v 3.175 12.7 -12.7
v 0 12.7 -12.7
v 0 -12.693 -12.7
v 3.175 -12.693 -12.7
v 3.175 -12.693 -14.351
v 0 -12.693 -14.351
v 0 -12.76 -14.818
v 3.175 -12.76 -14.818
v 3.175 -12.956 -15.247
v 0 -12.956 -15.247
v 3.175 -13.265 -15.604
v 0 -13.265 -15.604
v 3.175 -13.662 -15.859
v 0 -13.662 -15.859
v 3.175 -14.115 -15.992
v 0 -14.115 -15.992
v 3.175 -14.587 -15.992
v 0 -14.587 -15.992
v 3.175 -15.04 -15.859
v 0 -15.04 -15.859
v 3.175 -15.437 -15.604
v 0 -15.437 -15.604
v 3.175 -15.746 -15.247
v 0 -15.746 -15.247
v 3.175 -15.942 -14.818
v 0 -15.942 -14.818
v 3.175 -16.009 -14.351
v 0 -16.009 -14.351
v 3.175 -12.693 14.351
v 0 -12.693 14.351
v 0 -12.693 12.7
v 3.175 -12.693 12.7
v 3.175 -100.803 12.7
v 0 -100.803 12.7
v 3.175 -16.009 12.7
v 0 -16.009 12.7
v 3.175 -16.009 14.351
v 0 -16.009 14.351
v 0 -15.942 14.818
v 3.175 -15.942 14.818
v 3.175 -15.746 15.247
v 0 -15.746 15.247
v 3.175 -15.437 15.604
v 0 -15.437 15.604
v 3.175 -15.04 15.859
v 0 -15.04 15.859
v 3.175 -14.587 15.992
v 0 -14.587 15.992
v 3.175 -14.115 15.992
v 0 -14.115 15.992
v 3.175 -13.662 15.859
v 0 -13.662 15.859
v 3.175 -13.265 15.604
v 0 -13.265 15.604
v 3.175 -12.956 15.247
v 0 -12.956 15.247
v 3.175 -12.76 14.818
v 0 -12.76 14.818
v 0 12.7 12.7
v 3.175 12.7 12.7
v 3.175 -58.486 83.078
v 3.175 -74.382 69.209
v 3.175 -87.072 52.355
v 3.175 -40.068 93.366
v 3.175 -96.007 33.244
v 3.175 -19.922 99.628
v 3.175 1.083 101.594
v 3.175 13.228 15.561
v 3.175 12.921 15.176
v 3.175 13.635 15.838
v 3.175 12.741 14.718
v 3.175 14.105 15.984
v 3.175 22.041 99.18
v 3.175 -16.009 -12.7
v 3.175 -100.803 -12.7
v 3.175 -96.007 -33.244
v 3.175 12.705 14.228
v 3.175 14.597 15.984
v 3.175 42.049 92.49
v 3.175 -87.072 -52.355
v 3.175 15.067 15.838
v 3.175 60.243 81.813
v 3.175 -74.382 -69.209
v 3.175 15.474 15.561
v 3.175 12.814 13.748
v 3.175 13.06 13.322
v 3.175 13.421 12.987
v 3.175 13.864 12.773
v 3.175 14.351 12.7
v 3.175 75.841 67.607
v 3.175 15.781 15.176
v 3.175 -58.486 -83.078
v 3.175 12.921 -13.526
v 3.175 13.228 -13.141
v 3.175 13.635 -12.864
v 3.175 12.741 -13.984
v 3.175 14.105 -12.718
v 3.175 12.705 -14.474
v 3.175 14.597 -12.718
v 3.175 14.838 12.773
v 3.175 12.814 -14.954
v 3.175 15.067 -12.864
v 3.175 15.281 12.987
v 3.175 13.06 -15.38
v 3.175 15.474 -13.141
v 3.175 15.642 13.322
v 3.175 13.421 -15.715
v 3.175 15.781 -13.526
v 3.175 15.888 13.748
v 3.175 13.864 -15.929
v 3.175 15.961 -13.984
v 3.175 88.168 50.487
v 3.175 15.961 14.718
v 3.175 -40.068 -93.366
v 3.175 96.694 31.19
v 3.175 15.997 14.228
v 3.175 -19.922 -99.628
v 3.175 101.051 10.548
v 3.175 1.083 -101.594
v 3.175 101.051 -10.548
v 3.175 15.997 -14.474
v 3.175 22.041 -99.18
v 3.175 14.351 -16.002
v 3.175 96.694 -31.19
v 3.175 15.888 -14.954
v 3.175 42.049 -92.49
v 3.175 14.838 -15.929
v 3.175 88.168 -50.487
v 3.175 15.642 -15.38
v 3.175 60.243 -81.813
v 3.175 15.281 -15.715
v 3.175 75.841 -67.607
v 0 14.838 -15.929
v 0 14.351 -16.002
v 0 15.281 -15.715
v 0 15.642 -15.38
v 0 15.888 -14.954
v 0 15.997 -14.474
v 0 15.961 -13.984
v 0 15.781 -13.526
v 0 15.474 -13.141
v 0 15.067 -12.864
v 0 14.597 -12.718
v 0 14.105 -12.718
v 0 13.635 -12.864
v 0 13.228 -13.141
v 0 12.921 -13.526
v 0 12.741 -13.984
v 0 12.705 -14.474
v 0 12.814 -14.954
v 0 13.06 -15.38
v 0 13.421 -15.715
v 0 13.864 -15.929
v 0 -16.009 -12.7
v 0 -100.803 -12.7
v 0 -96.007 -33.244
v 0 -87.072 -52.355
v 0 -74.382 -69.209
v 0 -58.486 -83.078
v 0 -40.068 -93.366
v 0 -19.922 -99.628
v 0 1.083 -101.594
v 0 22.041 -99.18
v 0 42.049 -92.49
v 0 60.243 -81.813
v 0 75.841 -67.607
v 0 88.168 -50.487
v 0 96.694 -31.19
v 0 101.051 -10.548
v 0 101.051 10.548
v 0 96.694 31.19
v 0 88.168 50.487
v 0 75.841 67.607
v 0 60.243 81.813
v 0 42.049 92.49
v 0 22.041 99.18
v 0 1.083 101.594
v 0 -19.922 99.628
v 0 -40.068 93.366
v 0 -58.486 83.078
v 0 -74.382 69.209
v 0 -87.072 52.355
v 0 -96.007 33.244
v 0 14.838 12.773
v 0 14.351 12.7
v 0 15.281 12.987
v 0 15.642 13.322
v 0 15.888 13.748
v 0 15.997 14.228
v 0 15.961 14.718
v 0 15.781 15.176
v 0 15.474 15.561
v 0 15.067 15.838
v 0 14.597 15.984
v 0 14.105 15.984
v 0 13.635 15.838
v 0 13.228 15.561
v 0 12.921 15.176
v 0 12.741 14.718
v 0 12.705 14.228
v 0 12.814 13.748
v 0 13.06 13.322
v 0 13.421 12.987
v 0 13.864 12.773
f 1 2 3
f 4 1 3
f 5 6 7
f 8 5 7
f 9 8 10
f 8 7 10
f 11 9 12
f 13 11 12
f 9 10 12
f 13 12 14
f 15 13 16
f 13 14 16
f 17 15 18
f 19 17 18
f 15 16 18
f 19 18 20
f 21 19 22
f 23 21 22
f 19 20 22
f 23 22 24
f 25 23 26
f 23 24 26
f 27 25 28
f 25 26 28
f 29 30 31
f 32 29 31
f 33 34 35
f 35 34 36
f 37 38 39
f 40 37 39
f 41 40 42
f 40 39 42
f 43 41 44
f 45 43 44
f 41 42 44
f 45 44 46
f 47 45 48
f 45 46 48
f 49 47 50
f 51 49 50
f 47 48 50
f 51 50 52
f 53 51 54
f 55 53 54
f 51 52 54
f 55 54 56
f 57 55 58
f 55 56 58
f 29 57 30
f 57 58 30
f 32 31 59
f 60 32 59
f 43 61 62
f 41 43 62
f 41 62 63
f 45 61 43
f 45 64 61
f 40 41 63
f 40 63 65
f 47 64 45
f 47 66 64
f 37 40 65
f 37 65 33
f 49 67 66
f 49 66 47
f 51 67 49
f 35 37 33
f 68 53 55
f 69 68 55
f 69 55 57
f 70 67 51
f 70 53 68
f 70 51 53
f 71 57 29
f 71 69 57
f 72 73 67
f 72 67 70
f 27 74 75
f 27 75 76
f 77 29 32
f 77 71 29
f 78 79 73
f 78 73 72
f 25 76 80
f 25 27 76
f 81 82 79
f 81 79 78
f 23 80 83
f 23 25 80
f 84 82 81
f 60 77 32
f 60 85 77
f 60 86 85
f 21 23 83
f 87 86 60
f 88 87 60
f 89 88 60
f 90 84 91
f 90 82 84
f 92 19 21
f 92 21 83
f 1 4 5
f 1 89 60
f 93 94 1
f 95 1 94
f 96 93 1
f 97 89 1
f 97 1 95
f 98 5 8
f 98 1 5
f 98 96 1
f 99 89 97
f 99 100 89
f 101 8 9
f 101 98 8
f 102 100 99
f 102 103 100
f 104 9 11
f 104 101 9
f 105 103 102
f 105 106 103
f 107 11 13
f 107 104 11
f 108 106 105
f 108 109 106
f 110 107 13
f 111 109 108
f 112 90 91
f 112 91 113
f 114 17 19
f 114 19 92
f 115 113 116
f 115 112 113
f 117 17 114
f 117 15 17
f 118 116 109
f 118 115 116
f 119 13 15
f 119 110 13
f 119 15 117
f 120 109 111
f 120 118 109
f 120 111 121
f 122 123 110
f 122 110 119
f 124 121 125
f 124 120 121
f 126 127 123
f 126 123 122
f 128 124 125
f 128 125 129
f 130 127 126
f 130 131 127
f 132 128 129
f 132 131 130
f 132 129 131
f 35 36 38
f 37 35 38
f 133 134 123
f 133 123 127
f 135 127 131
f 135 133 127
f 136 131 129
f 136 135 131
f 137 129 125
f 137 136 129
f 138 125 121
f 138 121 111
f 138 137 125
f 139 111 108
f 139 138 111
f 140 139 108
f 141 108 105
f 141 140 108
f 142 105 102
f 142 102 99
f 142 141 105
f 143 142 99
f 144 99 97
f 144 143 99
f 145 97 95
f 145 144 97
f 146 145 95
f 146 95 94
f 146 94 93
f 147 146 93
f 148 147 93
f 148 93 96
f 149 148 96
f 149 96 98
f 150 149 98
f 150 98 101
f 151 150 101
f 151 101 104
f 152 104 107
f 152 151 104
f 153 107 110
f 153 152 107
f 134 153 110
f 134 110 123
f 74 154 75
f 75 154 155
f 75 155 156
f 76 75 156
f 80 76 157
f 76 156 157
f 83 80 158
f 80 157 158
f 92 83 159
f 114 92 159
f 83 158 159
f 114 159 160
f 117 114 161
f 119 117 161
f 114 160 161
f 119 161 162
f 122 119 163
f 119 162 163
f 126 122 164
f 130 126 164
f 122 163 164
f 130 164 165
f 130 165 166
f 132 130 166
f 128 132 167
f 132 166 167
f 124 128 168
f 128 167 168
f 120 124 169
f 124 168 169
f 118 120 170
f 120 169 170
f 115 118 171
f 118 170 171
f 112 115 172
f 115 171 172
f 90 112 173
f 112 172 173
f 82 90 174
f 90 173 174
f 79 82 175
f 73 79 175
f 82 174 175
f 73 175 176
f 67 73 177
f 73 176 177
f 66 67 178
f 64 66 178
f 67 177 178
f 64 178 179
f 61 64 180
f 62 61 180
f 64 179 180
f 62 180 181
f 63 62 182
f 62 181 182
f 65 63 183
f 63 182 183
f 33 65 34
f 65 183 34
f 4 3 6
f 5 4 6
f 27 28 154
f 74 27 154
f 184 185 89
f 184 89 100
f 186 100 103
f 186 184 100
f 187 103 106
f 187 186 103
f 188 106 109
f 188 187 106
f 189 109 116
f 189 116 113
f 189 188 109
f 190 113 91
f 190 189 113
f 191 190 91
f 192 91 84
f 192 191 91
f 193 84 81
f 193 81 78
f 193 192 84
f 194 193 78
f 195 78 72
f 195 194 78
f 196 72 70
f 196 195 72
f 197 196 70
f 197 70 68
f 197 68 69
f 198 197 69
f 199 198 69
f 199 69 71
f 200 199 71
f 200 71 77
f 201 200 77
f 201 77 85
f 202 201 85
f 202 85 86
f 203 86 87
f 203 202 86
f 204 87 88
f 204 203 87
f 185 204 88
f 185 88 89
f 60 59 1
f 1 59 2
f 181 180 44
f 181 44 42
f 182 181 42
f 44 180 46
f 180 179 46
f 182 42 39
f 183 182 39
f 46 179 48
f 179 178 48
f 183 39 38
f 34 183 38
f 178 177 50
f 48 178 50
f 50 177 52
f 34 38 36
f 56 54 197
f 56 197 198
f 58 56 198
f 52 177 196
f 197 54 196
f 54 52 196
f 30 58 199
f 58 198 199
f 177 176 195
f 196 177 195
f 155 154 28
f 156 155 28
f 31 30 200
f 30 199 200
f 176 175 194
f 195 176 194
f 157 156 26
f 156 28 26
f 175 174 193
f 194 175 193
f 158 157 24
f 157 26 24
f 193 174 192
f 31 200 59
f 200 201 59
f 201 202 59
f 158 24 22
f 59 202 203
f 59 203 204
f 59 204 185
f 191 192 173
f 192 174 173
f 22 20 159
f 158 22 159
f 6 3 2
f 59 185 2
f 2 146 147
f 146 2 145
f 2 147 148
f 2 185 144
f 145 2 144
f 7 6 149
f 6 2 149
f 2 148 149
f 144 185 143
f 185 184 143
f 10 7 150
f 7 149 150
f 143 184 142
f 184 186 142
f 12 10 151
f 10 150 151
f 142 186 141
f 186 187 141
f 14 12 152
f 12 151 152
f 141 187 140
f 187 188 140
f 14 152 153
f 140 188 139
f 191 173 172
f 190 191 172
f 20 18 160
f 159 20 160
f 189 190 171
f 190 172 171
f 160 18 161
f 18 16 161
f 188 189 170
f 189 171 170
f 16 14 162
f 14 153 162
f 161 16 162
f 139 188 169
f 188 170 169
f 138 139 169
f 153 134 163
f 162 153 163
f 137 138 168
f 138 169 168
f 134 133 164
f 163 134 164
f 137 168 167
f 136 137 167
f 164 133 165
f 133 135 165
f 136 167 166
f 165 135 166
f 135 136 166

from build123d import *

# Parameters (mm, degrees)
SKETCH1_R           = 1.651
BOSS_EXTRUDE1_DEPTH = 3.175


with BuildPart() as part:
    # Sketch1 → Boss-Extrude1 (new body)
    with BuildSketch(Plane(origin=(0, 0, 0), x_dir=(0, 0, -1), z_dir=(1, 0, 0))):
        with BuildLine():
            Line((-12.7, -12.693314325), (-12.7, 12.7))
            Line((-12.7, 12.7), (12.7, 12.7))
            Line((12.7, 12.7), (12.7, -12.693314325))
            Line((12.7, -12.693314325), (14.351, -12.693314325))
            ThreePointArc((14.351, -12.693314325), (16.008685675, -14.351), (14.351, -16.008685675))
            Line((14.351, -16.008685675), (12.7, -16.008685675))
            Line((12.7, -16.008685675), (12.7, -100.803124952))
            ThreePointArc((12.7, -100.803124952), (0, 101.6), (-12.7, -100.803124952))
            Line((-12.7, -100.803124952), (-12.7, -16.008685675))
            Line((-12.7, -16.008685675), (-14.351, -16.008685675))
            ThreePointArc((-14.351, -16.008685675), (-16.008685675, -14.351), (-14.351, -12.693314325))
            Line((-14.351, -12.693314325), (-12.7, -12.693314325))
        make_face()
        with Locations((-14.351, 14.351)):
            Circle(SKETCH1_R, mode=Mode.SUBTRACT)
        with Locations((14.351, 14.351)):
            Circle(SKETCH1_R, mode=Mode.SUBTRACT)
    extrude(amount=BOSS_EXTRUDE1_DEPTH)


solid = part.part
